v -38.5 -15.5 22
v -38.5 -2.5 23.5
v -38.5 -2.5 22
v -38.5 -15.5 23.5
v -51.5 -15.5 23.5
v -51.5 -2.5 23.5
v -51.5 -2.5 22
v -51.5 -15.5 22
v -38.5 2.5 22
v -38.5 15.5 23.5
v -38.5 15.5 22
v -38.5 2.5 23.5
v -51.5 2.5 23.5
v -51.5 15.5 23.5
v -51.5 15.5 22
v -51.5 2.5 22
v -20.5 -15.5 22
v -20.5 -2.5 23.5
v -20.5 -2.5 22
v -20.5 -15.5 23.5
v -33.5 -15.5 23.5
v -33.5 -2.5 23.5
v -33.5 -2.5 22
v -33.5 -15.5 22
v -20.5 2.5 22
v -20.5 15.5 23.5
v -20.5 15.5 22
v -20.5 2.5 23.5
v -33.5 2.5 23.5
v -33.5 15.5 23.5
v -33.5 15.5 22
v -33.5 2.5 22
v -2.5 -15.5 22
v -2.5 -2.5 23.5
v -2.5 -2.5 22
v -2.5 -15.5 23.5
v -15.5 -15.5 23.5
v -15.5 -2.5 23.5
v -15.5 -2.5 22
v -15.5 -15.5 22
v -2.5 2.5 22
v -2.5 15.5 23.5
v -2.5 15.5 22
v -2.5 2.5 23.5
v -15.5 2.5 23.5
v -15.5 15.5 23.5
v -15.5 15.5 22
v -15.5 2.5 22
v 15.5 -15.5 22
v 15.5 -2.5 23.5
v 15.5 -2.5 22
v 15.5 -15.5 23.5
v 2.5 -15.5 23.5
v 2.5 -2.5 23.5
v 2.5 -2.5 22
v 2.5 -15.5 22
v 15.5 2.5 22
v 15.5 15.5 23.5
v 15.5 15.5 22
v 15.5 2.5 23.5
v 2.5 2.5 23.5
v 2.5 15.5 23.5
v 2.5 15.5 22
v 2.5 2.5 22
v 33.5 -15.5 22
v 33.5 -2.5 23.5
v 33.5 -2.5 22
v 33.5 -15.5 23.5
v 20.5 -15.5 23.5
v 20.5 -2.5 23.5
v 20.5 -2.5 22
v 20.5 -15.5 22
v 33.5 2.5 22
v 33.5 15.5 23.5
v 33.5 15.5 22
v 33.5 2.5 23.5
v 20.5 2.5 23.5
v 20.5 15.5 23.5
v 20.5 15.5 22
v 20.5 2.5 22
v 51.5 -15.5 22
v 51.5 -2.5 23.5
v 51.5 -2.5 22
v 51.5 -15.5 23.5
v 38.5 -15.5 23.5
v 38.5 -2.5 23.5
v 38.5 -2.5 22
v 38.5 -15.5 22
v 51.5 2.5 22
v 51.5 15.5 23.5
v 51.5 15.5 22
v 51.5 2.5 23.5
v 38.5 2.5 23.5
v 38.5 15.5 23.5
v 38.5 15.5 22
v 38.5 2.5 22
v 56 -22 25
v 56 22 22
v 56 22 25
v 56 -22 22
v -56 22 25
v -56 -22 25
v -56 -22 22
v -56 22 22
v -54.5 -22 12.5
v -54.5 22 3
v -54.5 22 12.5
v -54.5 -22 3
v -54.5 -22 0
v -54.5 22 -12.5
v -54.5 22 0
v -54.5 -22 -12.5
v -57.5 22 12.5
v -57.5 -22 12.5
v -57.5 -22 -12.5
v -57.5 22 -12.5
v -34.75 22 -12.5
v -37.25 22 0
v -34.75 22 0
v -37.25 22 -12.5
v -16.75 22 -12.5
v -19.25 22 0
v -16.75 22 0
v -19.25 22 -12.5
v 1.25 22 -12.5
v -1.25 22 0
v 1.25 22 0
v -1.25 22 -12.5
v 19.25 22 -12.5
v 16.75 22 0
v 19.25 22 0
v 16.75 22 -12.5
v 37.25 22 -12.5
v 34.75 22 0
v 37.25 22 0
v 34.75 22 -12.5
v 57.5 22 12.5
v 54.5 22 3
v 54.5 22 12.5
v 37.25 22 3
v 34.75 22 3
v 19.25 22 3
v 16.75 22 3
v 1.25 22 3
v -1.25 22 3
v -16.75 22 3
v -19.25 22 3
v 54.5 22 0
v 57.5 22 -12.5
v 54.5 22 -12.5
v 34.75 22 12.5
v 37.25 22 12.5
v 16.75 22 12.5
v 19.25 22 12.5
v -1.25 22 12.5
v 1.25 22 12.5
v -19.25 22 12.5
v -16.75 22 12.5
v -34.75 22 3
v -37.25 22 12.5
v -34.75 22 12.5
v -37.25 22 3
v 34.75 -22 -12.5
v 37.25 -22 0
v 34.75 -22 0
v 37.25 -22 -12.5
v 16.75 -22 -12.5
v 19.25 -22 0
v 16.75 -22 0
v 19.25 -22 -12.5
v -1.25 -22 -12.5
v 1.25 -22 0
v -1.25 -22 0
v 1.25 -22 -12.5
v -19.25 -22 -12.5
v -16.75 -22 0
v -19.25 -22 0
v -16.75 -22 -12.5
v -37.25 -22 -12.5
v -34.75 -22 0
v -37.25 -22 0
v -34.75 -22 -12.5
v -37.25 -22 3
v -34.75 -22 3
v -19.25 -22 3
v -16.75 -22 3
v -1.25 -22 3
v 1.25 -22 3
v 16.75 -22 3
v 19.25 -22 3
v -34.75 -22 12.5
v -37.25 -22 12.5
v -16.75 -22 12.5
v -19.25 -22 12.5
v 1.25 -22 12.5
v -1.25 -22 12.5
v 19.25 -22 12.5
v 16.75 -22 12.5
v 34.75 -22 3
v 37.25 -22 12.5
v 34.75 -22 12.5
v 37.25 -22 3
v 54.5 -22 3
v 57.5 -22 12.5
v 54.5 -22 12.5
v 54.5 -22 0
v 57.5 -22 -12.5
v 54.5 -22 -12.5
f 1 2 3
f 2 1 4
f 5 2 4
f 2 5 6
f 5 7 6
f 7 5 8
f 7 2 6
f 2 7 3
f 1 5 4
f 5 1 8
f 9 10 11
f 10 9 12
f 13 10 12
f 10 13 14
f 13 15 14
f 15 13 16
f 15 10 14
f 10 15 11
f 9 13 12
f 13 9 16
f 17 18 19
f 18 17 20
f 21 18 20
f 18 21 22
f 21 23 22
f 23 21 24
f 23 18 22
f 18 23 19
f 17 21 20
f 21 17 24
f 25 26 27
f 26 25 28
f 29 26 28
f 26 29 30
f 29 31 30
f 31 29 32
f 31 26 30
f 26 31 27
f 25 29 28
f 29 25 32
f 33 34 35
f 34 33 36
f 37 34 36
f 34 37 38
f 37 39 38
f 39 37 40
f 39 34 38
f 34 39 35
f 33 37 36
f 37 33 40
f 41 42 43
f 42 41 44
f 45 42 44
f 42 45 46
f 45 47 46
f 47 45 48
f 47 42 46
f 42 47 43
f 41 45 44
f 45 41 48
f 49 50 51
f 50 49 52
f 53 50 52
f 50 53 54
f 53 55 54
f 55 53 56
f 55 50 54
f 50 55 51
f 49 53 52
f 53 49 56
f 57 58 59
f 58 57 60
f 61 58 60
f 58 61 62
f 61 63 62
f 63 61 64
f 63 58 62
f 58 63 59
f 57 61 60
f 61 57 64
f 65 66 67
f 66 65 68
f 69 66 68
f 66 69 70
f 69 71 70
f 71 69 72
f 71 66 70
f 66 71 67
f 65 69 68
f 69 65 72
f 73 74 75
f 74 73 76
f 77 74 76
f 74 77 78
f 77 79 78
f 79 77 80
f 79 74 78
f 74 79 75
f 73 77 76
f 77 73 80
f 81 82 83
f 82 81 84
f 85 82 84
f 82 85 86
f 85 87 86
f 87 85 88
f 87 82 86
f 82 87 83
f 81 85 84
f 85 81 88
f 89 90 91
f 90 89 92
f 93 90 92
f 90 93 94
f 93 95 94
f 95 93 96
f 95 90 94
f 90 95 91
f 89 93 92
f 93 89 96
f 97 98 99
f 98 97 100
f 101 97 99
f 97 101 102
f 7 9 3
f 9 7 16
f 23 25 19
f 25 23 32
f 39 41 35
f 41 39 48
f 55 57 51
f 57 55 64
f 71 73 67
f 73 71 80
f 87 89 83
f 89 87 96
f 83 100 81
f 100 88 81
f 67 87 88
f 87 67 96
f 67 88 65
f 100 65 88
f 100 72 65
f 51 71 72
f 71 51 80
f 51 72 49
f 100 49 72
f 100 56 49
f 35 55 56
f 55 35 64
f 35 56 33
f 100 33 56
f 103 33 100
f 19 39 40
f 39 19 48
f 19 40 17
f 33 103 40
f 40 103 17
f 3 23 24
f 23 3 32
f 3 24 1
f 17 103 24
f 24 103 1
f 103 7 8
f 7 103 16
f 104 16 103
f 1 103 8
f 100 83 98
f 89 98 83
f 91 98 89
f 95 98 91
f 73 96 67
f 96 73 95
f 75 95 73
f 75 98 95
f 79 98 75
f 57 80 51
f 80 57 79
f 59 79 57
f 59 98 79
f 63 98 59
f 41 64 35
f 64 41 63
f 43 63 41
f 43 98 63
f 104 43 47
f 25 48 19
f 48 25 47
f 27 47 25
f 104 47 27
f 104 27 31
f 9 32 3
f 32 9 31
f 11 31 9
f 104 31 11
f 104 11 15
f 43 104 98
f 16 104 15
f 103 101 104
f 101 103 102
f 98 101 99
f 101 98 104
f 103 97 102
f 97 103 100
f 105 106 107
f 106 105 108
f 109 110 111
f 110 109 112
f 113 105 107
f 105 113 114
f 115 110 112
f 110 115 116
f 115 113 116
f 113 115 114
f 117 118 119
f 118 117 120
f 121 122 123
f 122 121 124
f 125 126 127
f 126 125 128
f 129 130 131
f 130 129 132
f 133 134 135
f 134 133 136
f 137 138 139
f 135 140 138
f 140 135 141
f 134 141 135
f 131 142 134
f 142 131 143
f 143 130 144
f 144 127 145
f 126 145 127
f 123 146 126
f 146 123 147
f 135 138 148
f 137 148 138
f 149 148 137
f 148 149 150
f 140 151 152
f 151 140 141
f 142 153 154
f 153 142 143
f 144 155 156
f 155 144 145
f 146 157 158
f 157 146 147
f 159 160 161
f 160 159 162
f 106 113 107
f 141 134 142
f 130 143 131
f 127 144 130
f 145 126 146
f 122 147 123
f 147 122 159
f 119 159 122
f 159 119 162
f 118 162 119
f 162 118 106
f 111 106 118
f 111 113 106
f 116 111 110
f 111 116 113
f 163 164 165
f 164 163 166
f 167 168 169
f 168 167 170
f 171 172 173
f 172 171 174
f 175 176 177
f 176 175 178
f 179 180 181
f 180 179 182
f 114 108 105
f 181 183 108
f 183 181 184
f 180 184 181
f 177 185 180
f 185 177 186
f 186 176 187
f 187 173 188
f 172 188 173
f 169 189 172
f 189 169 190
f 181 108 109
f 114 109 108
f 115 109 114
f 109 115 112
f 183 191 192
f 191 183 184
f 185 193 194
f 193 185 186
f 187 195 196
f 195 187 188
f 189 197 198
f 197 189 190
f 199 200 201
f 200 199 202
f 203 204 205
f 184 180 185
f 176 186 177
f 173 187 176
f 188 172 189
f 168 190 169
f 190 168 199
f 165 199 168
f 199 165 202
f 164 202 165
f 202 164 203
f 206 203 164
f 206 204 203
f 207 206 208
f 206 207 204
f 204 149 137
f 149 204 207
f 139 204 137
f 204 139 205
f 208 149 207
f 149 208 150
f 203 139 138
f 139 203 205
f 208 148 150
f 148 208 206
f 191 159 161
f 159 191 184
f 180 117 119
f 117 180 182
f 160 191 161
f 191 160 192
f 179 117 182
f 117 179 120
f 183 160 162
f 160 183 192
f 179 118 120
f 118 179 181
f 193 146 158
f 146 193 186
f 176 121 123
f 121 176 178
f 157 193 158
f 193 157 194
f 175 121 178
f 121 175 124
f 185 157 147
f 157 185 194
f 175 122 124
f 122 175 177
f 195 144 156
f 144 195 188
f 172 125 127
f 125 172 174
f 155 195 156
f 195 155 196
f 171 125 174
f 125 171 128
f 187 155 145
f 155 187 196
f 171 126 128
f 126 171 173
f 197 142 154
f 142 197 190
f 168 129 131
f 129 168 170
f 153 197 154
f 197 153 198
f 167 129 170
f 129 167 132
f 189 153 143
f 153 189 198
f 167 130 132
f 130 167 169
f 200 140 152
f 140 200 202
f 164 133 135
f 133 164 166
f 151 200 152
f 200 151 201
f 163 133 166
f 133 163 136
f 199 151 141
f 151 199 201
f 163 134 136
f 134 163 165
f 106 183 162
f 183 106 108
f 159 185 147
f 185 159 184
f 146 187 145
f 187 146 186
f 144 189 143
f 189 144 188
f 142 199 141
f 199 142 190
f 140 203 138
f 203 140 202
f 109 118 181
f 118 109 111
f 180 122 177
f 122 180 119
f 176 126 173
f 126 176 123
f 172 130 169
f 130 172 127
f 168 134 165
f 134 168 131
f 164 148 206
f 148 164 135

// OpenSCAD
// 12-cuvette rack, printed standing on its base (z = 0 to 25)
// All dimensions in mm, taken from the user's caliper measurements.

$fn = 64;

// Base & deck plates
base_x = 112;   // X length of base plate
base_y = 44;    // Y depth of base plate
base_t = 3;     // base plate thickness (z 0..3)
deck_t = 3;     // deck plate thickness (z 22..25)
deck_z = 22;    // bottom of deck plate

// Upright walls (z 0..25, full Y depth)
wall_h = 25;    // total wall height
end_w  = 3;     // end-wall thickness (X)
rib_w  = 2.5;   // rib thickness (X)
rib_x  = [-36, -18, 0, 18, 36]; // rib centre X positions

// Deck through-holes
hole_s = 13;    // square hole side (13 x 13)
pitch  = 18;    // centre-to-centre spacing in both X and Y
rows_y = 2;     // rows along Y
cols_x = 6;     // columns along X

// ---- Base plate (z 0..3) ----
module base() {
    translate([-base_x / 2, -base_y / 2, 0])
        cube([base_x, base_y, base_t]);
}

// ---- Deck plate (z 22..25) with 12 square through-holes ----
module deck() {
    translate([0, 0, deck_z])
        difference() {
            translate([-base_x / 2, -base_y / 2, 0])
                cube([base_x, base_y, deck_t]);
            for (i = [0 : cols_x - 1]) {
                for (j = [0 : rows_y - 1]) {
                    hx = (i - (cols_x - 1) / 2) * pitch;
                    hy = (j - (rows_y - 1) / 2) * pitch;
                    translate([hx, hy, -1])
                        cube([hole_s, hole_s, deck_t + 2], center = true);
                }
            }
        }
}

// ---- Upright walls (z 0..25, full Y depth) ----
module walls() {
    union() {
        // Two 3 mm end walls flush with the short ends (x = ±56)
        for (ex = [-base_x / 2, base_x / 2]) {
            translate([ex, 0, 0])
                cube([end_w, base_y, wall_h], center = true);
        }
        // Five 2.5 mm ribs at the given X centres
        for (rx = rib_x) {
            translate([rx, 0, 0])
                cube([rib_w, base_y, wall_h], center = true);
        }
    }
}

// ---- Assemble the rack ----
union() {
    base();
    deck();
    walls();
}
